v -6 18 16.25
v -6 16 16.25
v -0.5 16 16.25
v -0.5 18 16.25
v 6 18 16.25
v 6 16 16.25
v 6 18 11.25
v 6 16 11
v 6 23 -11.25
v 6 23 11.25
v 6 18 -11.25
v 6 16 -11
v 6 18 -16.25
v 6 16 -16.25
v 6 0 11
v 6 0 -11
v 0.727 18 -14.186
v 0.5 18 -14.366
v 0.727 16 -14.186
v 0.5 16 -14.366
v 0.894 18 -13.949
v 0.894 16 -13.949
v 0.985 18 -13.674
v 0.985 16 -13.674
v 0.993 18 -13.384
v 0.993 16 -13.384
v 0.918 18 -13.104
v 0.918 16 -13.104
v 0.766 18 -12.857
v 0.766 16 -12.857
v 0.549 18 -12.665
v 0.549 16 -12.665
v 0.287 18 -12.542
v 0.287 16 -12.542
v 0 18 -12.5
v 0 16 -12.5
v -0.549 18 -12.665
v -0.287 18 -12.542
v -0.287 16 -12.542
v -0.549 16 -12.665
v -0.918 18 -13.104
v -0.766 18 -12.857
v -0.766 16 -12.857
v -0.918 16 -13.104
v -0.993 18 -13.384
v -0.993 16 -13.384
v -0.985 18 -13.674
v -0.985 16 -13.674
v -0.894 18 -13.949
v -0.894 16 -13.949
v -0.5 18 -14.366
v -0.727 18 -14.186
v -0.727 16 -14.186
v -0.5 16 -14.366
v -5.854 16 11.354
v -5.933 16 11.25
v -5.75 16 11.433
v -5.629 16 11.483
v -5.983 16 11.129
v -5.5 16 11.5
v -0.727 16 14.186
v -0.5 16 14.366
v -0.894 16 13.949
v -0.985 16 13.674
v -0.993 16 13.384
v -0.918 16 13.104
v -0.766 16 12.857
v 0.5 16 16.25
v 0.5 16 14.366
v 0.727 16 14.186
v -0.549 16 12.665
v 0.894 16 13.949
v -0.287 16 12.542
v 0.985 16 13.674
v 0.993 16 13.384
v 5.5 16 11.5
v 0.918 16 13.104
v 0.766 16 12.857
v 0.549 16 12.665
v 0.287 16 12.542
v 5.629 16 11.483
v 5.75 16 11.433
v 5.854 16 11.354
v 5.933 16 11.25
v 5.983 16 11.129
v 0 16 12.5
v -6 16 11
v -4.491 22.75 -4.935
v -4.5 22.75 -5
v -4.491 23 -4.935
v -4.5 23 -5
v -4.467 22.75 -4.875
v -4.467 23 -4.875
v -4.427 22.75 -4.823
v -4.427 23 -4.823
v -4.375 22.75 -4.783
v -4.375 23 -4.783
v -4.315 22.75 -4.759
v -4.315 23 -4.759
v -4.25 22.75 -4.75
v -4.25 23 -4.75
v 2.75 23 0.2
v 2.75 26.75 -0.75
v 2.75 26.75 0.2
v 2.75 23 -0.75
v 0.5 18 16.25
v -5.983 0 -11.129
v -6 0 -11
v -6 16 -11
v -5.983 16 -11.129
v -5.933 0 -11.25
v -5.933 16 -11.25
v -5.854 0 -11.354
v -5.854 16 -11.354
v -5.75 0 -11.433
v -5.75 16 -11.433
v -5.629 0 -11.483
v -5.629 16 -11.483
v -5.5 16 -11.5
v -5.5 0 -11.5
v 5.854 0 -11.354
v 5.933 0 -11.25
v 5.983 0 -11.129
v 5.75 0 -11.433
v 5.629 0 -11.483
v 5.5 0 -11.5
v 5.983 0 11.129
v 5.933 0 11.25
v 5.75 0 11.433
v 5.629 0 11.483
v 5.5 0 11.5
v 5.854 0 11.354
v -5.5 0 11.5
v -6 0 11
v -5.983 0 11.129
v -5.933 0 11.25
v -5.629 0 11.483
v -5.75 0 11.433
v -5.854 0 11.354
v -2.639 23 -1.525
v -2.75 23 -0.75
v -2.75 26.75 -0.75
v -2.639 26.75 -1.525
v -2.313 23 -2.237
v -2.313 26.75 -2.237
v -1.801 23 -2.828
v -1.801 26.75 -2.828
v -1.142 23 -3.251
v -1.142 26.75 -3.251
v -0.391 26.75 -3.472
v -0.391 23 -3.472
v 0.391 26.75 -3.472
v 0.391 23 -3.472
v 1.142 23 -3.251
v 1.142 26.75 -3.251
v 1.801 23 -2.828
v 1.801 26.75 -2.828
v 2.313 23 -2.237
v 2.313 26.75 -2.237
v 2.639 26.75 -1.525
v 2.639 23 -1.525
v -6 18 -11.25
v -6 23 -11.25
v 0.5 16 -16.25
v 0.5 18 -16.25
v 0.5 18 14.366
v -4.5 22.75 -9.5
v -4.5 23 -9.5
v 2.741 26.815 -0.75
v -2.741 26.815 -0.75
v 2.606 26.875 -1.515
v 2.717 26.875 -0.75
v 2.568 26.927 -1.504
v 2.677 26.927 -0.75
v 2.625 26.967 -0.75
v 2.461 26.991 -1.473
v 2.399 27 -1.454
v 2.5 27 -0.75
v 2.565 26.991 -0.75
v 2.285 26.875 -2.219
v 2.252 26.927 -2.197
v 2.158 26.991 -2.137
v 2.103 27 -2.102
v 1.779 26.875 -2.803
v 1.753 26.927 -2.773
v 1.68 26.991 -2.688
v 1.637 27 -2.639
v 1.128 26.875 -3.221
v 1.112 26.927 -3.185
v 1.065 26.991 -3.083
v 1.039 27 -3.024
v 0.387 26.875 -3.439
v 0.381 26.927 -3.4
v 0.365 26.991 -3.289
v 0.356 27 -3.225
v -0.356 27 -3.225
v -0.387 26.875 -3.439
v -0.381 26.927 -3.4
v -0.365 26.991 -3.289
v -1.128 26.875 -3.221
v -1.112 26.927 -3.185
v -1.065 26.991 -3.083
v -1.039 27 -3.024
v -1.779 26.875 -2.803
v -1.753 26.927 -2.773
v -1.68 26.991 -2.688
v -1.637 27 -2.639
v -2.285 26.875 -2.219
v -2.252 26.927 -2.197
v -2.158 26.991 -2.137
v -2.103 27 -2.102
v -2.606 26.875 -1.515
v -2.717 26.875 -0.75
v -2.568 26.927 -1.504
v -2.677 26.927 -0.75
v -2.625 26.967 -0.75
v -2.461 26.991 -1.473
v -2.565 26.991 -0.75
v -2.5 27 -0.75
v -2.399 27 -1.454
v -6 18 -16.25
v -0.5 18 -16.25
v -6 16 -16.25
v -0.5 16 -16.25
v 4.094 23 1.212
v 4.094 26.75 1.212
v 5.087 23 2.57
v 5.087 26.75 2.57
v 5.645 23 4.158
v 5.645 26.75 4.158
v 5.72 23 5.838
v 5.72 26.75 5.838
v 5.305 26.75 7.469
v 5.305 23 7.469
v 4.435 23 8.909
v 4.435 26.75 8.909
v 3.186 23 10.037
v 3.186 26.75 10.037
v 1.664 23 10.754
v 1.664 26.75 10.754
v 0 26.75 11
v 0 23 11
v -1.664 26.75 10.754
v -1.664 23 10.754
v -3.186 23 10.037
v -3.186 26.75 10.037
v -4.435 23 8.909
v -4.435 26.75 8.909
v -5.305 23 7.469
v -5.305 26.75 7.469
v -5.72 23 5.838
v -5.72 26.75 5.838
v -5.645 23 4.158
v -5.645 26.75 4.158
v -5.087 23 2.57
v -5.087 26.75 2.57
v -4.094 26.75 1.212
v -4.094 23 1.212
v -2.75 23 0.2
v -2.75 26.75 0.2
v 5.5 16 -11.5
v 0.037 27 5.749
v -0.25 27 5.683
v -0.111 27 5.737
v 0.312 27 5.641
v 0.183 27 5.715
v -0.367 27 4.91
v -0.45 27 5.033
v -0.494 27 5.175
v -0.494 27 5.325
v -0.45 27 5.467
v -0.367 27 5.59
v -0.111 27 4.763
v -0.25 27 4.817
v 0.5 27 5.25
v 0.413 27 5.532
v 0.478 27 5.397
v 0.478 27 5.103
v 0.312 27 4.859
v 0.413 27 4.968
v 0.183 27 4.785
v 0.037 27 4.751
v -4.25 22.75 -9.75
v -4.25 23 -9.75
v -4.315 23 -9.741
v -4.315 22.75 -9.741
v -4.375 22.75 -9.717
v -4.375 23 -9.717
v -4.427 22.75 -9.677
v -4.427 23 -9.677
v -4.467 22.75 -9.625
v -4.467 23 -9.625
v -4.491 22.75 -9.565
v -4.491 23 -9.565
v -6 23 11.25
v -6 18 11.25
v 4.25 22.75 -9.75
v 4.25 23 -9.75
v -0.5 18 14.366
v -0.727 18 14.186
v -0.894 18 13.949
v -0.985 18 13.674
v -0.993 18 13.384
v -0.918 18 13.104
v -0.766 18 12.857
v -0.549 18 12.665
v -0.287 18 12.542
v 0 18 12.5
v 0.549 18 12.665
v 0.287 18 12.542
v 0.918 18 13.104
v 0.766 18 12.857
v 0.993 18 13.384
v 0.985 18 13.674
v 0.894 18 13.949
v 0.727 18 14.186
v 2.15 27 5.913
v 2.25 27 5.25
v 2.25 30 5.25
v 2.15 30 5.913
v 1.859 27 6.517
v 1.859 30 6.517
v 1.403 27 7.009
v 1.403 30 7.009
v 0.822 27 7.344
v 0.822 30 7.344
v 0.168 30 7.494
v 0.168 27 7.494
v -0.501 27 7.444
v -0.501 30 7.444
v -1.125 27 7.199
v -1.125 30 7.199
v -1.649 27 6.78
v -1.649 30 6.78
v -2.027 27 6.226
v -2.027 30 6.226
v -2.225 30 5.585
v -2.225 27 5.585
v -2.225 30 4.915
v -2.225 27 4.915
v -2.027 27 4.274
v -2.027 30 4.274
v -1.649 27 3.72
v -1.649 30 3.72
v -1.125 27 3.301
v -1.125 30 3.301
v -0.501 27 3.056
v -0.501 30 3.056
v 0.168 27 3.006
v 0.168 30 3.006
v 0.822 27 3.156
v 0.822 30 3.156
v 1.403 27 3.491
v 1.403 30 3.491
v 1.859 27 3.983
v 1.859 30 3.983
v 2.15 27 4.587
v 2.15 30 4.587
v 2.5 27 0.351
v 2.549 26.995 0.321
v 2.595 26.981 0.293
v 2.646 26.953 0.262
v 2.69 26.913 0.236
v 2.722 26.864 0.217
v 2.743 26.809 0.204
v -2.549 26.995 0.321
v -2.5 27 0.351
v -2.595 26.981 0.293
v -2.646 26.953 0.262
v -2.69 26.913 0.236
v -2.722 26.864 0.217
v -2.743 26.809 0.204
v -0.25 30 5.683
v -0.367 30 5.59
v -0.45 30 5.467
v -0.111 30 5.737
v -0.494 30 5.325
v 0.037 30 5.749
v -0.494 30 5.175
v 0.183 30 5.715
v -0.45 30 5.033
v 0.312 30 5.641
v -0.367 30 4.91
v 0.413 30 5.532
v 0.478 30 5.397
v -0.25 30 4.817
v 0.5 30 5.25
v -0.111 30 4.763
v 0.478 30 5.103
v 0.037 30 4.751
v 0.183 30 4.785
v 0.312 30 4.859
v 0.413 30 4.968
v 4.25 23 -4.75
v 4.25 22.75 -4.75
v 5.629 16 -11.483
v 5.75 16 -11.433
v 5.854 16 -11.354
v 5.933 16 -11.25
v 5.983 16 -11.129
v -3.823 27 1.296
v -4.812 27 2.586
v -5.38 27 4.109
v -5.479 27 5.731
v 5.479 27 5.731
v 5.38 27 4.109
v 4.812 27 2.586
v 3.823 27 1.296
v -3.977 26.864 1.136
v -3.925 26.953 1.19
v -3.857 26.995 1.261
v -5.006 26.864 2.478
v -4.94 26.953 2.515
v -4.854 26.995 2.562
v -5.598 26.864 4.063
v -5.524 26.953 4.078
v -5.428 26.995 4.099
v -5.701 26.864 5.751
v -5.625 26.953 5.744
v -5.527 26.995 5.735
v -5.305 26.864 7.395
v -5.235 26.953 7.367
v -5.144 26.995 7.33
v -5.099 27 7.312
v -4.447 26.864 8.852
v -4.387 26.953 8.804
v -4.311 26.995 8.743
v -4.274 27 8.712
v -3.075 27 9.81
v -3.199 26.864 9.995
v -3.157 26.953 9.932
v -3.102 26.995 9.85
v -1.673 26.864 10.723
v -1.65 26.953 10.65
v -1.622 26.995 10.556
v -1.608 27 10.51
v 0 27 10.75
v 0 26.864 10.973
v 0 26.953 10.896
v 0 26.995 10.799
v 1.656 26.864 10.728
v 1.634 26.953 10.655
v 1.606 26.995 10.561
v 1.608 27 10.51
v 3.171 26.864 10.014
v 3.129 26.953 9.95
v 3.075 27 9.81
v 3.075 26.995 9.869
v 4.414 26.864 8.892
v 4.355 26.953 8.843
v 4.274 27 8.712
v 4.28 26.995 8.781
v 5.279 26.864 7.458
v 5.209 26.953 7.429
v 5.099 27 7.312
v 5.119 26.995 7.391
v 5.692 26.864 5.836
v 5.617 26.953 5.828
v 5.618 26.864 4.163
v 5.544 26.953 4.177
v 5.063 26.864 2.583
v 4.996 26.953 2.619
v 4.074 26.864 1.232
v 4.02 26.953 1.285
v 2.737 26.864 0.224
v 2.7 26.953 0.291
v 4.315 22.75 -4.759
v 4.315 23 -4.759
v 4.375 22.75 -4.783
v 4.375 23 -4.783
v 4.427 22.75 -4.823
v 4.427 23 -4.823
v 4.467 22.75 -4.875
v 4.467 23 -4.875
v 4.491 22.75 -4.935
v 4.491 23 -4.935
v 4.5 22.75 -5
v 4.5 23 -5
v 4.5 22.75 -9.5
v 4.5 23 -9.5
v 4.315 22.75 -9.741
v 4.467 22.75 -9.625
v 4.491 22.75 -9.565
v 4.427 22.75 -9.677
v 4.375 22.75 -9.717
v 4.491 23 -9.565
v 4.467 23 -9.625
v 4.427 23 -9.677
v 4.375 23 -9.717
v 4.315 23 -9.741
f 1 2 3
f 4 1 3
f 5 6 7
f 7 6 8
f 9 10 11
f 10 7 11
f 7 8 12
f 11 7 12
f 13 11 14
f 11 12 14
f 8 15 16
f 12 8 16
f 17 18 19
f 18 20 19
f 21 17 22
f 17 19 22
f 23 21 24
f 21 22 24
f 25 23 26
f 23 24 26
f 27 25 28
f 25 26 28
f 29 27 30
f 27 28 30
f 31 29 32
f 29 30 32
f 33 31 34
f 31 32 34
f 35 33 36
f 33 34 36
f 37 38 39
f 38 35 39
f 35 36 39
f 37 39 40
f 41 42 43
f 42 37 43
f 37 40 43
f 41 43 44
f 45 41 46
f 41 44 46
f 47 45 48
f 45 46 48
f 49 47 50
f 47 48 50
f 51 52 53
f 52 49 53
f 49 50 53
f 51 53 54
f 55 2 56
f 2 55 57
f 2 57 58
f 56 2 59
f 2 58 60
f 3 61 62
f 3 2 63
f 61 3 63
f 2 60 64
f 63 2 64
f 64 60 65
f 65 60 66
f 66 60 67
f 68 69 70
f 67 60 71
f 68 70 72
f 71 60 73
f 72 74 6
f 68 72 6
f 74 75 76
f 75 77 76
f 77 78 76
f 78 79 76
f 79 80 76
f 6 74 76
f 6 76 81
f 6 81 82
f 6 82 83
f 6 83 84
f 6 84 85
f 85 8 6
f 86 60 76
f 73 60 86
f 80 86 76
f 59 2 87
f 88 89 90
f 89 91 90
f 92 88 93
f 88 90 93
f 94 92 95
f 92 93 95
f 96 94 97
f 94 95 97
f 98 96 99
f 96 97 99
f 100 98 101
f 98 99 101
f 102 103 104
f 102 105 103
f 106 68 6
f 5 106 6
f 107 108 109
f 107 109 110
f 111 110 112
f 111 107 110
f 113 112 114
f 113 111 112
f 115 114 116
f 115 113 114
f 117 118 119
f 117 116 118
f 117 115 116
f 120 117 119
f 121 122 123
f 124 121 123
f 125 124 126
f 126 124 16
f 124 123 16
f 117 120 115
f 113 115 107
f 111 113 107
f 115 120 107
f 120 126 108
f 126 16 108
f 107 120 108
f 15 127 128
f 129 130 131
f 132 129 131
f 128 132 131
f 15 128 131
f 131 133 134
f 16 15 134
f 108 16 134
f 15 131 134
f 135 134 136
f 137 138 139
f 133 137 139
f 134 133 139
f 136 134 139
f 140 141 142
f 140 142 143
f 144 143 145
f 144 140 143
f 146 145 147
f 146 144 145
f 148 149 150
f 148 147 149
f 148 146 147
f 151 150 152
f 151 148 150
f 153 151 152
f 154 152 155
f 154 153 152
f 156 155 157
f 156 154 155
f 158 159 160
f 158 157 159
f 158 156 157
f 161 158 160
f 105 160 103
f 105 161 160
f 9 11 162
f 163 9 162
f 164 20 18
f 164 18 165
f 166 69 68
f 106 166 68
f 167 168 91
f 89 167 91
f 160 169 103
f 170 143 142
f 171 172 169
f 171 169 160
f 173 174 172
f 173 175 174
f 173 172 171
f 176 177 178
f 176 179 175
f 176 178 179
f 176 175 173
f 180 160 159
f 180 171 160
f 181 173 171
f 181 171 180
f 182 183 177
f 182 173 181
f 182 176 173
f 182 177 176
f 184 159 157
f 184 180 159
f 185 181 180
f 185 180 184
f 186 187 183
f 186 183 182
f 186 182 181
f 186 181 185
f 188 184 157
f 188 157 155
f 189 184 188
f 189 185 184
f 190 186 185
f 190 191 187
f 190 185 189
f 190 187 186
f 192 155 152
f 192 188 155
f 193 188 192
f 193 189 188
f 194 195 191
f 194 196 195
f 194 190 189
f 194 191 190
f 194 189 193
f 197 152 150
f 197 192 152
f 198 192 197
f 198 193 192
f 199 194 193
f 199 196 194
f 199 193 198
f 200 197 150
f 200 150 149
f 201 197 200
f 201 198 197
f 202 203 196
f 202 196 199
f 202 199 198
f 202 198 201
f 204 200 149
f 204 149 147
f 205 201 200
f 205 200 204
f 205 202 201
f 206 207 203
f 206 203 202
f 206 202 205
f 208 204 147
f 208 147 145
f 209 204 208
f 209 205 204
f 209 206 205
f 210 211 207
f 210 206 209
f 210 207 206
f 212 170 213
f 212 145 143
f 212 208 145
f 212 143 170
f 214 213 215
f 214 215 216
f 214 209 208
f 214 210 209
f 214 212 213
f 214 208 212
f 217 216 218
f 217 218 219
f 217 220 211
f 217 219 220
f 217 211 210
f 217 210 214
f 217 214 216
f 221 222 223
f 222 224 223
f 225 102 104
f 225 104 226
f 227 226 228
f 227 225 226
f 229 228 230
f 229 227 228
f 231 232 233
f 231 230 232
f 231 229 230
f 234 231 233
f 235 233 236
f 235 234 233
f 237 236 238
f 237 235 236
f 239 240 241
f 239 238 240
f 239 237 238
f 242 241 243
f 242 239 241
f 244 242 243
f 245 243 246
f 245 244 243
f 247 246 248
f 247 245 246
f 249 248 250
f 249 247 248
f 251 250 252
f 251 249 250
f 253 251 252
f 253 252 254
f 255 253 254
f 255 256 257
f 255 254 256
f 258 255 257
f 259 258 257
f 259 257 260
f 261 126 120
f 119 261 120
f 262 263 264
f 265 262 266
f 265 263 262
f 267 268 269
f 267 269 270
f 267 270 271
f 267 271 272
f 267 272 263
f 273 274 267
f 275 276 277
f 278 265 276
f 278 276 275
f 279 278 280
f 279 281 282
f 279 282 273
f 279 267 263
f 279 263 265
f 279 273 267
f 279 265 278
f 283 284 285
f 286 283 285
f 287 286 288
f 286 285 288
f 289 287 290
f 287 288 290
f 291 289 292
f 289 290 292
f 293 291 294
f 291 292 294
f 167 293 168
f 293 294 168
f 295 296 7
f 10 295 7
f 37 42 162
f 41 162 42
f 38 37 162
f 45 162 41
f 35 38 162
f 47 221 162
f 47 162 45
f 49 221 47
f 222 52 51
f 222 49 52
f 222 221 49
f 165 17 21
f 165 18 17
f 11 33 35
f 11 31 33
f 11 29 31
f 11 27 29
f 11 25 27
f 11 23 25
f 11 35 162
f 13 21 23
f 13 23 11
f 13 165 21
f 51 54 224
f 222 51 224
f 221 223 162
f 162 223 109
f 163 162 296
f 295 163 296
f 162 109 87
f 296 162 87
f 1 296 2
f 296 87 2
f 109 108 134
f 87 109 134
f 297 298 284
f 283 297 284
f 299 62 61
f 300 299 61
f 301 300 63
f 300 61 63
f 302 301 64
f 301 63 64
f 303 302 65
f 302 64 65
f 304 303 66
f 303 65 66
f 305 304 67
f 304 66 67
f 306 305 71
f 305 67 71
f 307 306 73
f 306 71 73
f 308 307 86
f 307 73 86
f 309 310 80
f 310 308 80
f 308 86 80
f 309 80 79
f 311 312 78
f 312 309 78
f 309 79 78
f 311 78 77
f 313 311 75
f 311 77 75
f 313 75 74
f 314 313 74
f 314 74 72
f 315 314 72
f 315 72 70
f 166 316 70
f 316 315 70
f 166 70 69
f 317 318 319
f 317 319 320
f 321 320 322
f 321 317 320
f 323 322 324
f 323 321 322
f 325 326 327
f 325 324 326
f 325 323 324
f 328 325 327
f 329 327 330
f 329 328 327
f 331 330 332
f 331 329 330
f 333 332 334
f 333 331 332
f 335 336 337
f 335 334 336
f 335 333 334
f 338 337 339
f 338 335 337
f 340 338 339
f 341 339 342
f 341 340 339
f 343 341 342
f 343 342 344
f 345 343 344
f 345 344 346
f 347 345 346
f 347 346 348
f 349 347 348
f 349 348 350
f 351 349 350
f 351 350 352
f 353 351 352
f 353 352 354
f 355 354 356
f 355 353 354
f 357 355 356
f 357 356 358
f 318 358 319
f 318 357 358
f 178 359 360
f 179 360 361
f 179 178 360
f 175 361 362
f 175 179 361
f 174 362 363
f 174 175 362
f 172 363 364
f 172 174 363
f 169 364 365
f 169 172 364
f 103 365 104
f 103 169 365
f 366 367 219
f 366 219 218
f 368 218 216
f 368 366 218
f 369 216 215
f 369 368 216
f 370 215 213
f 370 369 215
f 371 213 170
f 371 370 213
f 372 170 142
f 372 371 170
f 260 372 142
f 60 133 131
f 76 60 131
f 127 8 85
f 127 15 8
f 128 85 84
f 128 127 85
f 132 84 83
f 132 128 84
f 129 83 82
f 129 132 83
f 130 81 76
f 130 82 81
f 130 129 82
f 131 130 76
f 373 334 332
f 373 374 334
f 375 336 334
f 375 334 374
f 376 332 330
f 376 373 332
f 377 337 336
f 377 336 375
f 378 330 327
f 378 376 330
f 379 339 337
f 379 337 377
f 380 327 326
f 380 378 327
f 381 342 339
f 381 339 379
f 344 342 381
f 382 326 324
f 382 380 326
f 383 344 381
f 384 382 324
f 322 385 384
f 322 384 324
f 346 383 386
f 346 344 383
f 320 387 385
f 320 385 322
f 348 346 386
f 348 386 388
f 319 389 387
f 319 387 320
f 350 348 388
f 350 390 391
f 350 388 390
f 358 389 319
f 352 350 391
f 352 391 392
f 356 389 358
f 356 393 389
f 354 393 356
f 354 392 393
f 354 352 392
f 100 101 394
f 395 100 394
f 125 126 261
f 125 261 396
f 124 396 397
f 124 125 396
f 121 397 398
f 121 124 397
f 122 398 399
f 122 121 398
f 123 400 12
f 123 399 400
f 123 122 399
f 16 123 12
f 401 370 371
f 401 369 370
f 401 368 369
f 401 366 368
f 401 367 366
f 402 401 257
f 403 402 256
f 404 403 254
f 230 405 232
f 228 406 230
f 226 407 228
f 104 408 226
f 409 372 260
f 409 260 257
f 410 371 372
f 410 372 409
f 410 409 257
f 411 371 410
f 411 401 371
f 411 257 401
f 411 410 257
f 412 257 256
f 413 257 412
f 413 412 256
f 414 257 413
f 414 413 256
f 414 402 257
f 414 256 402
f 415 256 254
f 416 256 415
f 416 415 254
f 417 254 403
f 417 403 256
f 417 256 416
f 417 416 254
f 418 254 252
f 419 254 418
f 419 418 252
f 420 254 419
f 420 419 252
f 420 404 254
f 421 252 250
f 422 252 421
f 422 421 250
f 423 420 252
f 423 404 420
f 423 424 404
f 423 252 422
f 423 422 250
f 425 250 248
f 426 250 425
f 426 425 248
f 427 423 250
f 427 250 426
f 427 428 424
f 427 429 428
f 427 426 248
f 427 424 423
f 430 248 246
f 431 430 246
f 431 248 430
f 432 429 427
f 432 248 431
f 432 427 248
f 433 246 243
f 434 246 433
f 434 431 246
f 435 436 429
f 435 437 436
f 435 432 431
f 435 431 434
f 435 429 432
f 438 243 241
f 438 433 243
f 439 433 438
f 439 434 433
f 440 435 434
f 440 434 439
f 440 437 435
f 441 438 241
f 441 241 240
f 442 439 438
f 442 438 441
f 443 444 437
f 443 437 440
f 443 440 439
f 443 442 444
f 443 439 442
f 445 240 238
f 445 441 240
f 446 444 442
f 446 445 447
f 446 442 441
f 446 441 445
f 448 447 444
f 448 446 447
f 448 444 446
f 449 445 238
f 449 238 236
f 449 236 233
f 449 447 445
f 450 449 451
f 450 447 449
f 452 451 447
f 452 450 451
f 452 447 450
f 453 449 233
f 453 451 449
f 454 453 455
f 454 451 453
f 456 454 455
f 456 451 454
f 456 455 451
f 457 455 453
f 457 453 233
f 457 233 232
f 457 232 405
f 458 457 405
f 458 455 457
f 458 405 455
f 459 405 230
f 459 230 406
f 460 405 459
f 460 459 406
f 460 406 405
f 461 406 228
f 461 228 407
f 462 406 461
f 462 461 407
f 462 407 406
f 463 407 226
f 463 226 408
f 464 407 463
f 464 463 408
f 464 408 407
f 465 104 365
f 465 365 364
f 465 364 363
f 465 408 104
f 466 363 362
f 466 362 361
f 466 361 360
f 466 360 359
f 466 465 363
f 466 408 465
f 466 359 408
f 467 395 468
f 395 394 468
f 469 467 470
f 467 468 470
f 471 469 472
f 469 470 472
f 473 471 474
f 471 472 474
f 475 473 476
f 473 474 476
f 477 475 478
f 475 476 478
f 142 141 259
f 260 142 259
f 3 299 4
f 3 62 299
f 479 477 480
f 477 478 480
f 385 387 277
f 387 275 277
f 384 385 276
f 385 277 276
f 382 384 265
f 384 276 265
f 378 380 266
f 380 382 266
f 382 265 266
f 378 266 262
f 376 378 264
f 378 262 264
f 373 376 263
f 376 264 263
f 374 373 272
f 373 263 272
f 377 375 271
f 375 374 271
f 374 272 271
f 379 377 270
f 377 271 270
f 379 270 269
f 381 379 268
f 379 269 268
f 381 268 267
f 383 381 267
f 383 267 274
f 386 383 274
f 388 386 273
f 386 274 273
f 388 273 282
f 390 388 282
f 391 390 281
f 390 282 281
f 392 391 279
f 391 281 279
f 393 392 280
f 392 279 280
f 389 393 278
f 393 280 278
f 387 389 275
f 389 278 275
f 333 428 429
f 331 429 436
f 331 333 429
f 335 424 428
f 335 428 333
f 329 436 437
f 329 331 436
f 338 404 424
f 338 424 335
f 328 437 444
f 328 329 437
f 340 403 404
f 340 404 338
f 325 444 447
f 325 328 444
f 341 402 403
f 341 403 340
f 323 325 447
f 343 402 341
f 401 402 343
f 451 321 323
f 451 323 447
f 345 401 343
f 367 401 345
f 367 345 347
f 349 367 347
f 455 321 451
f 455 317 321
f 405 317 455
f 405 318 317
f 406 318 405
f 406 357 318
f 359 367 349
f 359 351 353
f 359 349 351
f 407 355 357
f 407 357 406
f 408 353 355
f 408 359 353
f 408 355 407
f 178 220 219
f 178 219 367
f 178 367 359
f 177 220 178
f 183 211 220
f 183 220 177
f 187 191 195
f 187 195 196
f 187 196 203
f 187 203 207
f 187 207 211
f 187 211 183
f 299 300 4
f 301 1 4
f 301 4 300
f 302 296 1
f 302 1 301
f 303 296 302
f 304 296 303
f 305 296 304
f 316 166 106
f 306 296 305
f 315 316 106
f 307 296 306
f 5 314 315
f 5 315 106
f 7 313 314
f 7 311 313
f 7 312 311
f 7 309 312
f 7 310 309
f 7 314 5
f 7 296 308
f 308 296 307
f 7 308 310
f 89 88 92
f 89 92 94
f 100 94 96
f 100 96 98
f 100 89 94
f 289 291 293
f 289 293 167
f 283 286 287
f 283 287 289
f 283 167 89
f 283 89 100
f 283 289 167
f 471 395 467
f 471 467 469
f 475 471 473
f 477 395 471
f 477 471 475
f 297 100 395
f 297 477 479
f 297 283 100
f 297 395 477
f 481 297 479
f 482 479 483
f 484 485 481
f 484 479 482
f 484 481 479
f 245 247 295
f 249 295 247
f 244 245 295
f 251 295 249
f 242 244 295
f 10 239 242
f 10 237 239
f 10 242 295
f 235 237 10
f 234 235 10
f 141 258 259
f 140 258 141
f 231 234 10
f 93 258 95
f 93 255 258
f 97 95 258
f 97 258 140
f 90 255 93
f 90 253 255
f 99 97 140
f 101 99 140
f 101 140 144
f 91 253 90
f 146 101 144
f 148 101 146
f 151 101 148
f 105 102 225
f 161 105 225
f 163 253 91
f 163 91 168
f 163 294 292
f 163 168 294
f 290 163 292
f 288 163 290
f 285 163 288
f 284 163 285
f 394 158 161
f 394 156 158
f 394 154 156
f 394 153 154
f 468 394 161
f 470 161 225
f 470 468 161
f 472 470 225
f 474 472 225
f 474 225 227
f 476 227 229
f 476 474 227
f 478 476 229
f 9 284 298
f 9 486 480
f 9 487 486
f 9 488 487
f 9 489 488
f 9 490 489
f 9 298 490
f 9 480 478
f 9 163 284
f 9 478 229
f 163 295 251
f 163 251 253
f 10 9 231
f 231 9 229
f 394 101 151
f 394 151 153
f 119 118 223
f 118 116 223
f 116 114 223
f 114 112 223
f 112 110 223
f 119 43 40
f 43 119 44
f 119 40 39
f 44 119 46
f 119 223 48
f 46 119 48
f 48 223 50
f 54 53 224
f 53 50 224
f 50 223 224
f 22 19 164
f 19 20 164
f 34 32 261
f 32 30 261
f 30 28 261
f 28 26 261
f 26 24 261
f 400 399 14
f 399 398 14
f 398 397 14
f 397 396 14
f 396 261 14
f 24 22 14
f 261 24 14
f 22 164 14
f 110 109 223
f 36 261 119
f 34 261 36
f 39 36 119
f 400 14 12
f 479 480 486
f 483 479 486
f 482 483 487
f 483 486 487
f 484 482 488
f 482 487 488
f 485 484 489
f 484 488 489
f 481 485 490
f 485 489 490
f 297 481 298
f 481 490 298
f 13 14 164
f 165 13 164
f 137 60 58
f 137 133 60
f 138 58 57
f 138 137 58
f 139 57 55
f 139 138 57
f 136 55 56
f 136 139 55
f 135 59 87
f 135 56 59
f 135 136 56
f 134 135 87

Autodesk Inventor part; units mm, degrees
ref_plane "YZ Plane" through (0, 0, 0) normal (1, 0, 0) x (0, 1, 0)
ref_plane "XZ Plane" through (0, 0, 0) normal (0, 1, 0) x (-1, 0, 0)
sketch "Эскиз1" plane through (0, 0, 0) normal (0, 1, 0) x (-1, 0, 0)
  line L0 (5.5, 11.5) -> (-5.5, 11.5)
  line L1 (-6, 11) -> (-6, -11)
  line L2 (-5.5, -11.5) -> (5.5, -11.5)
  line L3 (6, -11) -> (6, 11)
  line L4 (6, 11.5) -> (-6, -11.5) construction
  line L5 (-6, 11.5) -> (6, -11.5) construction
  arc A0 (6, 11) -> (5.5, 11.5) centre (5.5, 11) ccw
  arc A1 (5.5, -11.5) -> (6, -11) centre (5.5, -11) ccw
  arc A2 (-6, -11) -> (-5.5, -11.5) centre (-5.5, -11) ccw
  arc A3 (-5.5, 11.5) -> (-6, 11) centre (-5.5, 11) ccw
  point P0 (0, 0)
  dimension "d0" = 12
  dimension "d1" = 23
  dimension "d2" = 0.5
extrude "Выдавливание1" add sketch "Эскиз1" along normal blind 16
sketch "Эскиз2" plane through (0, 16, 0) normal (0, 1, 0) x (1, 0, 0)
  line L0 (6, -16.25) -> (6, 16.25)
  line L1 (-6, 16.25) -> (-6, -16.25)
  line L2 (-6, -16.25) -> (6, 16.25) construction
  line L3 (6, -16.25) -> (-6, 16.25) construction
  arc A0 (0.5, -14.366) -> (-0.5, -14.366) centre (0, -13.5) ccw
  arc A1 (-0.5, 14.366) -> (0.5, 14.366) centre (0, 13.5) ccw
  line L4 (-0.5, -14.366) -> (-0.5, -16.25)
  line L5 (0.5, -14.366) -> (0.5, -16.25)
  line L6 (-6, -16.25) -> (-0.5, -16.25)
  line L7 (0.5, -16.25) -> (6, -16.25)
  line L8 (-0.5, 14.366) -> (-0.5, 16.25)
  line L9 (0.5, 14.366) -> (0.5, 16.25)
  line L10 (6, 16.25) -> (0.5, 16.25)
  line L11 (-0.5, 16.25) -> (-6, 16.25)
  point P0 (0, 0)
  point P1 (0, 0)
  point P2 (0, 0)
  dimension "d5" = 12
  dimension "d6" = 32.5
  dimension "d7" = 2
  dimension "d8" = 2
  dimension "d9" = 1
  dimension "d10" = 0.5
  dimension "d13" = 27
  dimension "d14" = 13.5
extrude "Выдавливание2" add sketch "Эскиз2" along normal blind 2
sketch "Эскиз3" plane through (0, 18, 0) normal (0, 1, 0) x (1, 0, 0)
  line L0 (6, -16.25) -> (6, 16.25) projected
  line L1 (-6, -11.25) -> (6, -11.25)
  line L2 (6, -11.25) -> (6, 11.25)
  line L3 (6, 11.25) -> (-6, 11.25)
  line L4 (-6, 11.25) -> (-6, -11.25)
  line L5 (-6, -11.25) -> (6, 11.25) construction
  line L6 (6, -11.25) -> (-6, 11.25) construction
  point P0 (0, 0)
  dimension "d15" = 22.5
  dimension "d18" = 12
extrude "Выдавливание3" add sketch "Эскиз3" along normal blind 5
sketch "Эскиз4" plane through (0, 23, 0) normal (0, 1, 0) x (1, 0, 0)
  arc A0 (-2.75, -0.2002) -> (2.75, -0.2002) centre (0, -5.25) ccw
  arc A1 (2.75, 0.75) -> (-2.75, 0.75) centre (0, 0.75) ccw
  line L0 (-2.75, 0.75) -> (-2.75, -0.2002)
  line L1 (2.75, 0.75) -> (2.75, -0.2002)
  line L2 (-6, -11.25) -> (6, -11.25) projected
  point P0 (0, 0)
  dimension "d19" = 11.5
  dimension "d20" = 5.25
  dimension "d21" = 5.5
  dimension "d22" = 6
  dimension "d23" = 11.25
extrude "Выдавливание4" add sketch "Эскиз4" along normal blind 4
fillet "Сопряжение1" radius 0.25 4 edges at (0, 27, 11) (0, 27, -3.5) (2.75, 27, -0.2749) (-2.75, 27, -0.2749)
sketch "Эскиз5" plane through (0, 23, 0) normal (0, 1, 0) x (1, 0, 0)
  line L0 (-4.25, 4.75) -> (4.25, 4.75)
  line L1 (4.5, 5) -> (4.5, 9.5)
  line L2 (4.25, 9.75) -> (-4.25, 9.75)
  line L3 (-4.5, 9.5) -> (-4.5, 5)
  line L4 (6, 11.25) -> (-6, 11.25) projected
  line L5 (-6, 11.25) -> (-6, -11.25) projected
  line L6 (6, -11.25) -> (6, 11.25) projected
  arc A0 (-4.5, 5) -> (-4.25, 4.75) centre (-4.25, 5) ccw
  arc A1 (-4.25, 9.75) -> (-4.5, 9.5) centre (-4.25, 9.5) ccw
  arc A2 (4.5, 9.5) -> (4.25, 9.75) centre (4.25, 9.5) ccw
  arc A3 (4.25, 4.75) -> (4.5, 5) centre (4.25, 5) ccw
  point P0 (0, 0)
  dimension "d27" = 1.5
  dimension "d28" = 1.5
  dimension "d29" = 1.5
  dimension "d30" = 5
  dimension "d31" = 0.25
extrude "Выдавливание5" cut sketch "Эскиз5" against normal blind 0.25
sketch "Эскиз6" plane through (0, 27, 0) normal (0, 1, 0) x (1, 0, 0)
  arc A0 (-2.5, -0.351) -> (2.5, -0.351) centre (0, -5.25) ccw projected
  circle A1 centre (0, -5.25) radius 2.25
  circle A2 centre (0, -5.25) radius 0.5
  point P0 (0, 0)
  dimension "d34" = 4.5
  dimension "d35" = 1
extrude "Выдавливание6" add sketch "Эскиз6" along normal blind 3
ref_plane "Work Plane1" through (0, 0, 11) normal (1, 0, 0) x (0, 0, -1)
equation "\"d8\" = d7"
equation "\"d14\" = 0.5 * d13"
equation "\"d28\" = d27"
equation "\"d29\" = d27"
equation "\"d45\" = 0.5 * d44"
equation "\"d44\" = 0.8"
properties part number "Servomotor HTX900" material "Поликарбонат, дымчатый"
